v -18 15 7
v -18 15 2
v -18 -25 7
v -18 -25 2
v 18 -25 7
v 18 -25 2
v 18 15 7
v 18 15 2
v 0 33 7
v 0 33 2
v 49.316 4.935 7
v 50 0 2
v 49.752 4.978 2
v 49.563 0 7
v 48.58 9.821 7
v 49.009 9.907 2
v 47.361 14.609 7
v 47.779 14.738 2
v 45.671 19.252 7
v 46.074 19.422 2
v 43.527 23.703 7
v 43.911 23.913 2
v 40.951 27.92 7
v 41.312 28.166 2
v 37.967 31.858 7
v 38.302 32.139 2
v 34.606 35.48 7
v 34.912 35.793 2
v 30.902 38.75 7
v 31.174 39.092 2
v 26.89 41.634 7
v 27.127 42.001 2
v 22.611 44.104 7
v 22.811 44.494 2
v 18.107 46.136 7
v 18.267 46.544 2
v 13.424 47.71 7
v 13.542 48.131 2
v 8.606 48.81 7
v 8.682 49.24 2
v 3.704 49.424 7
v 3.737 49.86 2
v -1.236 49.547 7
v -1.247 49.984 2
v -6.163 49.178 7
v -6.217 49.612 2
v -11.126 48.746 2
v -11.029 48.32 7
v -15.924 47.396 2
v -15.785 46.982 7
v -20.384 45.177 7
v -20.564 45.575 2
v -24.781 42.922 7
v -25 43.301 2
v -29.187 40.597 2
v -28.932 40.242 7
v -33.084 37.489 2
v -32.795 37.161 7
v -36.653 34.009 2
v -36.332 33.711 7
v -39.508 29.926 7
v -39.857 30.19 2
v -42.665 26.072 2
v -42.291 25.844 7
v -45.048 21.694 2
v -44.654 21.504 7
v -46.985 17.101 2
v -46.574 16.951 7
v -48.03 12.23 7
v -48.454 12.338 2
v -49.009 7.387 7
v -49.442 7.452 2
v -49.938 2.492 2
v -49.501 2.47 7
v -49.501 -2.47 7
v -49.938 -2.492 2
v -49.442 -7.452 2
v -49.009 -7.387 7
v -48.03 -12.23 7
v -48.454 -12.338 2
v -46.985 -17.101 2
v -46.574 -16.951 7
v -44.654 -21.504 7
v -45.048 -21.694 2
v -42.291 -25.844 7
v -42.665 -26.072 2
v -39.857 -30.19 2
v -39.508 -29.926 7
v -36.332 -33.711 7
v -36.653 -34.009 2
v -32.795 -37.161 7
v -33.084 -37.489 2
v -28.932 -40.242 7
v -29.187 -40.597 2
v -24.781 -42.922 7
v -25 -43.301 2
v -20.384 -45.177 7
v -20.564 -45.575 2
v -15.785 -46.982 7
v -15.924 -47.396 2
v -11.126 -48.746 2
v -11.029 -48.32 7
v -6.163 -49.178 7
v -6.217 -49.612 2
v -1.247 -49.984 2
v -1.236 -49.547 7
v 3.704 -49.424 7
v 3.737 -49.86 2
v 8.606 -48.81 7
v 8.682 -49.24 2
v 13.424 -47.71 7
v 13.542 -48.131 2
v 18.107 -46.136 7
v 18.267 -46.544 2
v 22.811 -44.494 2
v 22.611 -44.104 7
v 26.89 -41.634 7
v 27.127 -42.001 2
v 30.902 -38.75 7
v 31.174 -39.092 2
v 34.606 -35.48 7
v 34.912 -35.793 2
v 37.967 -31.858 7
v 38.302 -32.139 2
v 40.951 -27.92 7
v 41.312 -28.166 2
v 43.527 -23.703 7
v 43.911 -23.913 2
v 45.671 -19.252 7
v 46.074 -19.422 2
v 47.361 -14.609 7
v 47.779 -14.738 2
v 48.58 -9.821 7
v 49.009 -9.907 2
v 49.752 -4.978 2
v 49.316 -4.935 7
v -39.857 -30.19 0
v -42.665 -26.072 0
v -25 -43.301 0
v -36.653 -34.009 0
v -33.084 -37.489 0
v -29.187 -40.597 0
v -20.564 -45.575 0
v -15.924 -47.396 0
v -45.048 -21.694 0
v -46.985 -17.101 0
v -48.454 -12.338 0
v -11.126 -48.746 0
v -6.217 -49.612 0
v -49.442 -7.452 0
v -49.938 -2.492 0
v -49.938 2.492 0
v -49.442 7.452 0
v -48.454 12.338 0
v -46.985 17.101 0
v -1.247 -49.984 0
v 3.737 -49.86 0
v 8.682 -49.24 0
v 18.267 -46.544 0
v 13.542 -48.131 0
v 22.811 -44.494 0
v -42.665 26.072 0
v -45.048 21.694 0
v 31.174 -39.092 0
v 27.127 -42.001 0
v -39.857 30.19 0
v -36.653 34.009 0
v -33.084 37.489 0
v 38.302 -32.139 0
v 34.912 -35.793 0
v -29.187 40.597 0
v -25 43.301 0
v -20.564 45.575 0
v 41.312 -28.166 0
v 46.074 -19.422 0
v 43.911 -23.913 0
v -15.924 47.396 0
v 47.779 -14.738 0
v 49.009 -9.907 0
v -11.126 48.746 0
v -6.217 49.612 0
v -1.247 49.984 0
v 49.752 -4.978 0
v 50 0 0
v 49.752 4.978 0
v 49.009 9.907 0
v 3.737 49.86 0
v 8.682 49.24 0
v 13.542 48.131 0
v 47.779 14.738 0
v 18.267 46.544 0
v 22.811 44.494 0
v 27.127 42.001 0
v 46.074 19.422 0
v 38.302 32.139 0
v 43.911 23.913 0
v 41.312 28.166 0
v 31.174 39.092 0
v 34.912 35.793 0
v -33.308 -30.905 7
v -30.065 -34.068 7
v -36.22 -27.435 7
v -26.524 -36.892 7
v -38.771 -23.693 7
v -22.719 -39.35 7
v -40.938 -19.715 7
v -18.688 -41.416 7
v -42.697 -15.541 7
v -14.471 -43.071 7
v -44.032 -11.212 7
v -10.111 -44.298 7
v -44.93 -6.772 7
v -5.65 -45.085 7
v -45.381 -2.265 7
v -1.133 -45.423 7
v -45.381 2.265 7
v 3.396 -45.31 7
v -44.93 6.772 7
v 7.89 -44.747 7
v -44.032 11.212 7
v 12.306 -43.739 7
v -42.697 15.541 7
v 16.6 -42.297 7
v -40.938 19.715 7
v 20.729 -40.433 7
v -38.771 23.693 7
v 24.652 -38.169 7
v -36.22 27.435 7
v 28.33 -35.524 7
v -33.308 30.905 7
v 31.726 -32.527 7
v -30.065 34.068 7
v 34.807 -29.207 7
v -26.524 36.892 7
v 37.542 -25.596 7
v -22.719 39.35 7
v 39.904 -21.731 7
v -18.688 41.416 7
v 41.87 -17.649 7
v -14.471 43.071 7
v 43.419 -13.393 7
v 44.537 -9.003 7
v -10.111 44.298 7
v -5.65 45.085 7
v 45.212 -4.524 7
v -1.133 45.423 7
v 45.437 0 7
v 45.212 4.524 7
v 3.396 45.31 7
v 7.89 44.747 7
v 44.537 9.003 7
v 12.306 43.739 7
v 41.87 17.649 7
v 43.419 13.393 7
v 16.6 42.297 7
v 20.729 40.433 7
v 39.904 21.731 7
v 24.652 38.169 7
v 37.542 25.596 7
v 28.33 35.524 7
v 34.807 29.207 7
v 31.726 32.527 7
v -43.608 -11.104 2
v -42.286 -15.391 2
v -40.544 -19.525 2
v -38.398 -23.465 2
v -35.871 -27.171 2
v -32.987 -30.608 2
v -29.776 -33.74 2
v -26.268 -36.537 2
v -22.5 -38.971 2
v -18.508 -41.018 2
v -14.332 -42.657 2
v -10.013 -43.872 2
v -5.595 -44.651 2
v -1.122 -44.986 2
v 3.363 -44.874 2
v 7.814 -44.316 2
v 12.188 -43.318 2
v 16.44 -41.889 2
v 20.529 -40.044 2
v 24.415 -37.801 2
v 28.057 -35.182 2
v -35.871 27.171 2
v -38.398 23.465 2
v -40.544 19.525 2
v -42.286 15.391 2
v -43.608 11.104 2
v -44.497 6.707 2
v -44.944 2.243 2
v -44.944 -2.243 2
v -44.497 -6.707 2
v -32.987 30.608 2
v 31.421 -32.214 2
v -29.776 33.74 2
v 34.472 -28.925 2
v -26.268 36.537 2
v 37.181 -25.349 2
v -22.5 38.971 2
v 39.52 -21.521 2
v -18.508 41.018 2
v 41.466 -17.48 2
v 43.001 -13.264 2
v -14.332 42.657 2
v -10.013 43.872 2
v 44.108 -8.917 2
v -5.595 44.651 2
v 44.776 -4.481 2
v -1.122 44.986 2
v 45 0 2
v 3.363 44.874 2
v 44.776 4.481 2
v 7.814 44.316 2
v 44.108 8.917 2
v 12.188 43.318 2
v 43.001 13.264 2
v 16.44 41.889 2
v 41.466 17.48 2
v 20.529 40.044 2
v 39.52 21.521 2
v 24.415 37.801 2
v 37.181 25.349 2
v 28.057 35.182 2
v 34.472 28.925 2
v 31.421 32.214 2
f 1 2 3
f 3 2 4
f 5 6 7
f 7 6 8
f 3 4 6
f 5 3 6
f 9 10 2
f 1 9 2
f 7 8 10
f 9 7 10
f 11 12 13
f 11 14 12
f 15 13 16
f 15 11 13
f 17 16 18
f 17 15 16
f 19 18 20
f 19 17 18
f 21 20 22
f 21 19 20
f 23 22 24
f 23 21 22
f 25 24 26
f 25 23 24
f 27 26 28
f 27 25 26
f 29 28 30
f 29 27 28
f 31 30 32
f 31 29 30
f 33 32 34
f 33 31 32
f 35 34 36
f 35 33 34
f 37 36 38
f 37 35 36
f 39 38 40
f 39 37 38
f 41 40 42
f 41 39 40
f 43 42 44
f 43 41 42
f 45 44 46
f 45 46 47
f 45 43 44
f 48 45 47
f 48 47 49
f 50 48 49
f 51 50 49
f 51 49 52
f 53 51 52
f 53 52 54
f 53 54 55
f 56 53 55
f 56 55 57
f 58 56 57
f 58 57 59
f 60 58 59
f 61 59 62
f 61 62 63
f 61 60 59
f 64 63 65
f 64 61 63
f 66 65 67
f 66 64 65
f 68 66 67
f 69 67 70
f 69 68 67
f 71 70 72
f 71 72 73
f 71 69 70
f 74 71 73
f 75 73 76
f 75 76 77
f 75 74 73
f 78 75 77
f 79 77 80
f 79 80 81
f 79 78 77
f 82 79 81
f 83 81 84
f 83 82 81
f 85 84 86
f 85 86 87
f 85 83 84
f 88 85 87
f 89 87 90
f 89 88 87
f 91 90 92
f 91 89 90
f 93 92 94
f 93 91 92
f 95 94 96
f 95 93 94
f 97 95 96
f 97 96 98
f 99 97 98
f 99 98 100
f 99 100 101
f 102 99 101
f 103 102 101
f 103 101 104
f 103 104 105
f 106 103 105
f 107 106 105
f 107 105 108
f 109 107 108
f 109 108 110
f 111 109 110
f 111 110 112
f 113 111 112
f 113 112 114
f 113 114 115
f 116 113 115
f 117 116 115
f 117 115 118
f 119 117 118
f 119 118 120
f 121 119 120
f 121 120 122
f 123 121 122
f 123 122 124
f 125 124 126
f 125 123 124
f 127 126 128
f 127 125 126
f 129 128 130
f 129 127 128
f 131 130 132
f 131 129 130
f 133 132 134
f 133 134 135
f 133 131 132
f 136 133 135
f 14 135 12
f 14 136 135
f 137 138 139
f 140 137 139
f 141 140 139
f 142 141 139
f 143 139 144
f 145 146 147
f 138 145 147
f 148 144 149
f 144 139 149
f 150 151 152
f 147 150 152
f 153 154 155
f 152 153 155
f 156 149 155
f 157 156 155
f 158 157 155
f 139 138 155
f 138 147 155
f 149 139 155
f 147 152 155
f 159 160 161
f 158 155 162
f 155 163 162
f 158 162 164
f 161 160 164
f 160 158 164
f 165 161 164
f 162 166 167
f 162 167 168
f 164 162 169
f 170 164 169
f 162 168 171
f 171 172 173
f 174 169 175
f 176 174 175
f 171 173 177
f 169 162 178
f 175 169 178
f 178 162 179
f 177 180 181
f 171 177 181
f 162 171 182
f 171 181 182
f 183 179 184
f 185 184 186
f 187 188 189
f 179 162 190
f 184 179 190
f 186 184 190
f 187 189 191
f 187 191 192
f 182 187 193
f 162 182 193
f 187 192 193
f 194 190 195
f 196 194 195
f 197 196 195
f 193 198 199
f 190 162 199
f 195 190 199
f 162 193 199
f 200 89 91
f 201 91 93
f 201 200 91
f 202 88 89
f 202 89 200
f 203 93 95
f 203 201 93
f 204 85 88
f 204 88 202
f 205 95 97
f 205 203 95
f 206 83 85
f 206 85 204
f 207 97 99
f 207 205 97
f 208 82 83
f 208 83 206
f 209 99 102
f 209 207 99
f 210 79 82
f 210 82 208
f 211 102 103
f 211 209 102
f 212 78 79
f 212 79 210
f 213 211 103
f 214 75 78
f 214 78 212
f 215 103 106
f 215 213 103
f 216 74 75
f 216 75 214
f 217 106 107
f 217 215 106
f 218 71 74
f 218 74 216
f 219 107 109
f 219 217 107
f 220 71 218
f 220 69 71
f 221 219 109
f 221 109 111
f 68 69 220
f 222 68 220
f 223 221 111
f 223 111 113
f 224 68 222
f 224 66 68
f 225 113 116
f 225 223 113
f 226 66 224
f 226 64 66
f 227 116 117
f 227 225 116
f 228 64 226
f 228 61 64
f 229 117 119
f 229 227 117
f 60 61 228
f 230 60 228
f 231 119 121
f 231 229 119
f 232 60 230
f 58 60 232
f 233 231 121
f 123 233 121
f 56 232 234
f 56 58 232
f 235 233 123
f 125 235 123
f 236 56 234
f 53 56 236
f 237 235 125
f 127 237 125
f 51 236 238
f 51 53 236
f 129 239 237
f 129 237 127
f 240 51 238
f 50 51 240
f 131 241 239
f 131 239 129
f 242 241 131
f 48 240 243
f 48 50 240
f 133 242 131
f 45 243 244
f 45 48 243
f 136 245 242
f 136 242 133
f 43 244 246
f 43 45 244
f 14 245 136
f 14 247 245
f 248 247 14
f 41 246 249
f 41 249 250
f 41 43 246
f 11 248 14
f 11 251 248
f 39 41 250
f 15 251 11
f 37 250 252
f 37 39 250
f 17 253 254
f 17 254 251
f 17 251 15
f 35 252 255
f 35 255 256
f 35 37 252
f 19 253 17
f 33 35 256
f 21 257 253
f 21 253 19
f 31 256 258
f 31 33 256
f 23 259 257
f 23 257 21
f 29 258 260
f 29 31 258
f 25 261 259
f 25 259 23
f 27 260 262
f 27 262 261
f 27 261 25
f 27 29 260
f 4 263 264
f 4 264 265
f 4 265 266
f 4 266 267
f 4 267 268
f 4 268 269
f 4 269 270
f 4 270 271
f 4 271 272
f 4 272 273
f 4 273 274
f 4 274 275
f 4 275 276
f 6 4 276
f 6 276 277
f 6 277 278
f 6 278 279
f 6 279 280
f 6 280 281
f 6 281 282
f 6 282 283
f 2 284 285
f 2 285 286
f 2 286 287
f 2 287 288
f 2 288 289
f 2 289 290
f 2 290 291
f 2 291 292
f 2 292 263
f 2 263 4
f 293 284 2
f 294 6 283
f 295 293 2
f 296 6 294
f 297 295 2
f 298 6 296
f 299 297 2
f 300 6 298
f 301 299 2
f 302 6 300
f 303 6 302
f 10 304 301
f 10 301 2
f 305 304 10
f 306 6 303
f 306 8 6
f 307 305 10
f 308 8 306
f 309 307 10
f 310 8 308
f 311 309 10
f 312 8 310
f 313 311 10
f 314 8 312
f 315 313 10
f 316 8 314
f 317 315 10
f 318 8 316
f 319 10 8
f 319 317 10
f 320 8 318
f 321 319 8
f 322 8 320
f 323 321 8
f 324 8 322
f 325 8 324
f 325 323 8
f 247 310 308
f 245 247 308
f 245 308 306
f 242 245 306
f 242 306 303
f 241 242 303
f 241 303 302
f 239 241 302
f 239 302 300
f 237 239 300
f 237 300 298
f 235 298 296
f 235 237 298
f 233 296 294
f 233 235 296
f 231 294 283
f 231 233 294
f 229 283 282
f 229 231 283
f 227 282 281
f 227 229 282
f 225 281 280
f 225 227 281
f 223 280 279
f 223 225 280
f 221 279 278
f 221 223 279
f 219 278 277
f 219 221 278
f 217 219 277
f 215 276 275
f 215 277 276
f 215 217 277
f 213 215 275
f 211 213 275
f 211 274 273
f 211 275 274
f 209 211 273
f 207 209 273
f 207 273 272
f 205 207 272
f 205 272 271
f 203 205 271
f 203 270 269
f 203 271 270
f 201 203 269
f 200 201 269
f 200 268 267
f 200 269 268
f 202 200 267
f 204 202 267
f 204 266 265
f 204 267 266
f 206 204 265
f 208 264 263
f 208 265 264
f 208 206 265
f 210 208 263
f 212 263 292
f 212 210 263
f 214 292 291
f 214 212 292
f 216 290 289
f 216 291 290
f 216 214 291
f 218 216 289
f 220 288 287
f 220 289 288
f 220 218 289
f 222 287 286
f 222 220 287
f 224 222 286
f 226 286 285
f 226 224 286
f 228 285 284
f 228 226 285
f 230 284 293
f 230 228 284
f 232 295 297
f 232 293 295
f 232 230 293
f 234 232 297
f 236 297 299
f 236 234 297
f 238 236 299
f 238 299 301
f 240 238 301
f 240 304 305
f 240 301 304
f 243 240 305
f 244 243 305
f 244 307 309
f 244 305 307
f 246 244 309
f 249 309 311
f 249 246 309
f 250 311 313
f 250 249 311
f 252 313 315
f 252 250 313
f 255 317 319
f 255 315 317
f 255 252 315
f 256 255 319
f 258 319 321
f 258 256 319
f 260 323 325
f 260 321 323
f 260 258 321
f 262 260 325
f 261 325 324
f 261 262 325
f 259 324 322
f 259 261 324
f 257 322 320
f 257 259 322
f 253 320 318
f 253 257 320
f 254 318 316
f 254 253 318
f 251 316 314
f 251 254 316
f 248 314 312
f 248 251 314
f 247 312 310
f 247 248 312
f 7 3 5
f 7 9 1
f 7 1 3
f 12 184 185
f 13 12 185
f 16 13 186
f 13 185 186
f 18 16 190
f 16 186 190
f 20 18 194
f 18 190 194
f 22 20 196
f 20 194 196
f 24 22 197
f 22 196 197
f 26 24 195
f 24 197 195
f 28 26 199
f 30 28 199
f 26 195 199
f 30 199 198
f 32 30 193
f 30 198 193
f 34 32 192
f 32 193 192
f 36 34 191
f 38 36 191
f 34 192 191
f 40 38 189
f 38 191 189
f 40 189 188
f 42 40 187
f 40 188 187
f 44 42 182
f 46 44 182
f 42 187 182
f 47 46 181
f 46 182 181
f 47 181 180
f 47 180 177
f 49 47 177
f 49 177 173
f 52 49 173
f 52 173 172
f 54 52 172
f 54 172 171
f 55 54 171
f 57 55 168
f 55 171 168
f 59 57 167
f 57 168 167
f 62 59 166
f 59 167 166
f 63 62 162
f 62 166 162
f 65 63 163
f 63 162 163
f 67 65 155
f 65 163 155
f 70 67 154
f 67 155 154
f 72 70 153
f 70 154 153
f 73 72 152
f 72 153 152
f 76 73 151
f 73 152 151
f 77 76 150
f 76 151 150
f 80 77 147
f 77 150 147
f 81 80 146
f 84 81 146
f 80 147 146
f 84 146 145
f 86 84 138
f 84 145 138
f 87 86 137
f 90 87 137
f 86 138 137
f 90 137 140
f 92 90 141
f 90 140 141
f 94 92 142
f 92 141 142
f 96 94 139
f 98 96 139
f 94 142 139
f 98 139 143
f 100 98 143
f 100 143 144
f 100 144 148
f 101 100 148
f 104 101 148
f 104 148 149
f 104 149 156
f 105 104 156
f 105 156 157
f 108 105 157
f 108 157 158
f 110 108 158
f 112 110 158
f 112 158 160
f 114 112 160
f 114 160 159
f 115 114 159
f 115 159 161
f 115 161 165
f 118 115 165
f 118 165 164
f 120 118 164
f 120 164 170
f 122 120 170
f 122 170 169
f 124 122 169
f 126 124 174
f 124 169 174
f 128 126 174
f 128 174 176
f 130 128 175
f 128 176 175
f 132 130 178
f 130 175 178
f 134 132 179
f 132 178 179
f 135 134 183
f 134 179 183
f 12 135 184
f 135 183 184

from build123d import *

# Parameters (mm, degrees)
F0_R     = 50
F1_DEPTH = 2
F2_R     = 50
F2_R_2   = 45
F3_DEPTH = 5
F3_TAPER = 5
F5_DEPTH = 5


with BuildPart() as f1:
    # F0 (on Top) → F1 (new body)
    with BuildSketch(Plane.XY):
        Circle(F0_R)
    extrude(amount=F1_DEPTH)

    # F2 (on face) → F3 (join)
    with BuildSketch(Plane.XY.offset(2)):
        Circle(F2_R)
        Circle(F2_R_2, mode=Mode.SUBTRACT)
    extrude(amount=F3_DEPTH, taper=F3_TAPER)

    # F4 (on face) → F5 (join, through all)
    with BuildSketch(Plane.XY.offset(2)):
        Polygon((-18, -25), (0, -25), (18, -25), (18, 15), (0, 33), (-18, 15), align=None)
    extrude(amount=F5_DEPTH)


solid = f1.part
